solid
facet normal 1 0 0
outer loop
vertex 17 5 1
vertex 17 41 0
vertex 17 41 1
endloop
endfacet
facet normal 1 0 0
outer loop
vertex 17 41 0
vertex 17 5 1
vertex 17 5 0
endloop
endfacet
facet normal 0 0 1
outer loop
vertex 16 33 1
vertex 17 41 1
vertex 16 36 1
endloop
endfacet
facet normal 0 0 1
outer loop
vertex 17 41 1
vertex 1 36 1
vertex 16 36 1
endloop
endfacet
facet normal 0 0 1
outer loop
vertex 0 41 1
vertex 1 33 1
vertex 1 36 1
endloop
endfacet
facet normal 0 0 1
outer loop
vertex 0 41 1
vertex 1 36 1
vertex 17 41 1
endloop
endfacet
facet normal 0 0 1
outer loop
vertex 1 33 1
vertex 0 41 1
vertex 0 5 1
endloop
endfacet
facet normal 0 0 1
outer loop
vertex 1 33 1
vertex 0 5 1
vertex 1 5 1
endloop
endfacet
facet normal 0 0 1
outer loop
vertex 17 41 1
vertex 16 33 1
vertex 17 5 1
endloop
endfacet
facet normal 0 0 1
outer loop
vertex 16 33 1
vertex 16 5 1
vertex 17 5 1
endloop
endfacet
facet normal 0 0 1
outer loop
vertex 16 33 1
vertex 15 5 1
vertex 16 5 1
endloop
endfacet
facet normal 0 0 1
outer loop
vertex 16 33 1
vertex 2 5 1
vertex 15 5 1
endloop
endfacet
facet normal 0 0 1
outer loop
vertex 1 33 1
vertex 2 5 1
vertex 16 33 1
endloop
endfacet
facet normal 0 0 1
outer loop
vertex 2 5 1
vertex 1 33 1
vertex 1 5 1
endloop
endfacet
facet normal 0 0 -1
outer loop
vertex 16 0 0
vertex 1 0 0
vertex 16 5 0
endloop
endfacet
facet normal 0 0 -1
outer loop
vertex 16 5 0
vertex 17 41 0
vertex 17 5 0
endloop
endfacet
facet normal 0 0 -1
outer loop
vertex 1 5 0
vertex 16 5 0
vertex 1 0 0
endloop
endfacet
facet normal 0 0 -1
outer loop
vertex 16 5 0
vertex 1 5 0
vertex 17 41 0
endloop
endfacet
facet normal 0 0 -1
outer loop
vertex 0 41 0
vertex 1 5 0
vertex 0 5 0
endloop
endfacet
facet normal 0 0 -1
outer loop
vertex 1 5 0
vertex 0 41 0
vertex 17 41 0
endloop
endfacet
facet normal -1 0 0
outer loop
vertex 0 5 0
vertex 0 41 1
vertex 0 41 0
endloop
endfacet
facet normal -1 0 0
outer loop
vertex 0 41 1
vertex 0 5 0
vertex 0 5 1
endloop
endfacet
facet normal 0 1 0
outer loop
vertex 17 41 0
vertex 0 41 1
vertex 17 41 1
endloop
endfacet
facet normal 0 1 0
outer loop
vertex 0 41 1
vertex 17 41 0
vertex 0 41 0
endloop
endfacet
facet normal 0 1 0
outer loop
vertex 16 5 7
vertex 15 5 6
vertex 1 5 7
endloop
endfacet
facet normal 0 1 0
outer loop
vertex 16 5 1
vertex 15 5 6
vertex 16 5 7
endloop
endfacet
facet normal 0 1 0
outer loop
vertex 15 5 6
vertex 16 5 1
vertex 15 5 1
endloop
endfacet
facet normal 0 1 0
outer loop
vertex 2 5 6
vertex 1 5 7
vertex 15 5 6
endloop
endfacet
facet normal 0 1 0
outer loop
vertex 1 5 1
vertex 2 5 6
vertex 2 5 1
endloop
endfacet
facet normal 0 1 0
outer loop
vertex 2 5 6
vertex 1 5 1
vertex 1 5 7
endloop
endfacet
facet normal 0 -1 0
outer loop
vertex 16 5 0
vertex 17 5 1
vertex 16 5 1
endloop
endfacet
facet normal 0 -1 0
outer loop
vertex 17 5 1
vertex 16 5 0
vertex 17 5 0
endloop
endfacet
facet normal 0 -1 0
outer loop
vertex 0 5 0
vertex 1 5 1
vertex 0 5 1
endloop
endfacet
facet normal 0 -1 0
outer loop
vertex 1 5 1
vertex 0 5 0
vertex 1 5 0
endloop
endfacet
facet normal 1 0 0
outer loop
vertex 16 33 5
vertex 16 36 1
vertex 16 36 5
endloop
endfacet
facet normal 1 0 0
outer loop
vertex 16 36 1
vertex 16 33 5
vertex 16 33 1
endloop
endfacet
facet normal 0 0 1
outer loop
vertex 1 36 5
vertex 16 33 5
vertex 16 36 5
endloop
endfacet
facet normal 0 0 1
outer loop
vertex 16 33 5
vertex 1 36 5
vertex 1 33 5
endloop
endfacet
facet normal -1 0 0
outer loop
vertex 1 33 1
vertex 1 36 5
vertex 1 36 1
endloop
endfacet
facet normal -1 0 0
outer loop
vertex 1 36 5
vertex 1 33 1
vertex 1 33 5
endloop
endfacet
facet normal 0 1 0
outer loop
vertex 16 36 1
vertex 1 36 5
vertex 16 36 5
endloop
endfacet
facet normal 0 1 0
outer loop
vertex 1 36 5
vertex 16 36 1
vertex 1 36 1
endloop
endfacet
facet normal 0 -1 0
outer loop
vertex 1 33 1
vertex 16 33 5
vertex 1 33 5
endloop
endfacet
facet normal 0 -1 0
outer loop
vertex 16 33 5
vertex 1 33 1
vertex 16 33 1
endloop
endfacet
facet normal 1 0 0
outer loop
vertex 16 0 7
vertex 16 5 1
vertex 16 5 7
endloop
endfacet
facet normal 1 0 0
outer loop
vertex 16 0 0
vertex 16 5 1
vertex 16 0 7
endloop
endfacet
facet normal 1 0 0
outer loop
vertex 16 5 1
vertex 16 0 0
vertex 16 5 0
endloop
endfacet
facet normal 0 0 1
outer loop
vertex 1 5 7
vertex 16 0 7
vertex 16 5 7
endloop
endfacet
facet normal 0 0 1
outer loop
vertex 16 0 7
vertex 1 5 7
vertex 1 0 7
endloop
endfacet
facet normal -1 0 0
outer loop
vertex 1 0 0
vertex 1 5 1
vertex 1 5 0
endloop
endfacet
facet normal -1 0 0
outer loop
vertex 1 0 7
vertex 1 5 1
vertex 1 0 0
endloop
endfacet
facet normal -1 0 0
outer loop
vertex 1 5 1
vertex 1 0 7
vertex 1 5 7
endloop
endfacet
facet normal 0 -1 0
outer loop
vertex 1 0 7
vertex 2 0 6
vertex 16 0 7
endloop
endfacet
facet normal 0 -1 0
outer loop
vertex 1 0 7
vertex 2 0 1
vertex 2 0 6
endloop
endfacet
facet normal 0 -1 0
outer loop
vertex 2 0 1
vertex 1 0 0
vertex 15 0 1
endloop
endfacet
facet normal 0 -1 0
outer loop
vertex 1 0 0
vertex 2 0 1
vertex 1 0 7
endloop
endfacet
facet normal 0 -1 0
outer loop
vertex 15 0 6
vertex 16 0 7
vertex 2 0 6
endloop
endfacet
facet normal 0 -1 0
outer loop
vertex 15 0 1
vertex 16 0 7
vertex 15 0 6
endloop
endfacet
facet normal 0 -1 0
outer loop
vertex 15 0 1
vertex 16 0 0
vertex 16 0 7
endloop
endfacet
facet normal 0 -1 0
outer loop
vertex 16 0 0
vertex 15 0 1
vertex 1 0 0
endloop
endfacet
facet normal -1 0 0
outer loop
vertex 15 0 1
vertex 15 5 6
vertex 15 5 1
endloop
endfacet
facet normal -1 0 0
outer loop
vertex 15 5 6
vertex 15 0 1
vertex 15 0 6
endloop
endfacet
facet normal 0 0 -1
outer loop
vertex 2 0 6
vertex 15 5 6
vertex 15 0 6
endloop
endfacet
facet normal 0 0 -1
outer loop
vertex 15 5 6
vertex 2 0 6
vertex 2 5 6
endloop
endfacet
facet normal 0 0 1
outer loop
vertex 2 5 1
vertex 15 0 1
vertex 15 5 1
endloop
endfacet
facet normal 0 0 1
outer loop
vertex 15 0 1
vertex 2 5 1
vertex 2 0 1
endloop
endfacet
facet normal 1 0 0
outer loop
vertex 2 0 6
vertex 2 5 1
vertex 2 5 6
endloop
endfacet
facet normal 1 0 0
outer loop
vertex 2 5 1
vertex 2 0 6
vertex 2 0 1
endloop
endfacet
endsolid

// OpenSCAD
pcbWidth = 15;
pcbLength = 34;

usbHeight = 5;
usbWidth = 13;

totalLength = 48;

side = 1;
baseThickness = 1;

// base
module base(riserHeight = 4) {
	cube([side + pcbWidth + side, side + pcbLength + side,baseThickness]);

	// riser
	translate([side, pcbLength - 6, baseThickness]) {
		cube([pcbWidth, 3, riserHeight]);
	}
}

// USB port border
module usbPort(length=5) {
	difference(){
		// size of USB port + border
		cube([side + usbWidth + side, length, side + usbHeight + side]);
		
		// minus USB port
		translate([side, 0, side]) {
			cube([usbWidth, length, usbHeight]);
		}
	}
}

translate([0,5,0]) {
	base();
}
translate([(pcbWidth - usbWidth)/2, 0, 0]) {
	usbPort();
}
